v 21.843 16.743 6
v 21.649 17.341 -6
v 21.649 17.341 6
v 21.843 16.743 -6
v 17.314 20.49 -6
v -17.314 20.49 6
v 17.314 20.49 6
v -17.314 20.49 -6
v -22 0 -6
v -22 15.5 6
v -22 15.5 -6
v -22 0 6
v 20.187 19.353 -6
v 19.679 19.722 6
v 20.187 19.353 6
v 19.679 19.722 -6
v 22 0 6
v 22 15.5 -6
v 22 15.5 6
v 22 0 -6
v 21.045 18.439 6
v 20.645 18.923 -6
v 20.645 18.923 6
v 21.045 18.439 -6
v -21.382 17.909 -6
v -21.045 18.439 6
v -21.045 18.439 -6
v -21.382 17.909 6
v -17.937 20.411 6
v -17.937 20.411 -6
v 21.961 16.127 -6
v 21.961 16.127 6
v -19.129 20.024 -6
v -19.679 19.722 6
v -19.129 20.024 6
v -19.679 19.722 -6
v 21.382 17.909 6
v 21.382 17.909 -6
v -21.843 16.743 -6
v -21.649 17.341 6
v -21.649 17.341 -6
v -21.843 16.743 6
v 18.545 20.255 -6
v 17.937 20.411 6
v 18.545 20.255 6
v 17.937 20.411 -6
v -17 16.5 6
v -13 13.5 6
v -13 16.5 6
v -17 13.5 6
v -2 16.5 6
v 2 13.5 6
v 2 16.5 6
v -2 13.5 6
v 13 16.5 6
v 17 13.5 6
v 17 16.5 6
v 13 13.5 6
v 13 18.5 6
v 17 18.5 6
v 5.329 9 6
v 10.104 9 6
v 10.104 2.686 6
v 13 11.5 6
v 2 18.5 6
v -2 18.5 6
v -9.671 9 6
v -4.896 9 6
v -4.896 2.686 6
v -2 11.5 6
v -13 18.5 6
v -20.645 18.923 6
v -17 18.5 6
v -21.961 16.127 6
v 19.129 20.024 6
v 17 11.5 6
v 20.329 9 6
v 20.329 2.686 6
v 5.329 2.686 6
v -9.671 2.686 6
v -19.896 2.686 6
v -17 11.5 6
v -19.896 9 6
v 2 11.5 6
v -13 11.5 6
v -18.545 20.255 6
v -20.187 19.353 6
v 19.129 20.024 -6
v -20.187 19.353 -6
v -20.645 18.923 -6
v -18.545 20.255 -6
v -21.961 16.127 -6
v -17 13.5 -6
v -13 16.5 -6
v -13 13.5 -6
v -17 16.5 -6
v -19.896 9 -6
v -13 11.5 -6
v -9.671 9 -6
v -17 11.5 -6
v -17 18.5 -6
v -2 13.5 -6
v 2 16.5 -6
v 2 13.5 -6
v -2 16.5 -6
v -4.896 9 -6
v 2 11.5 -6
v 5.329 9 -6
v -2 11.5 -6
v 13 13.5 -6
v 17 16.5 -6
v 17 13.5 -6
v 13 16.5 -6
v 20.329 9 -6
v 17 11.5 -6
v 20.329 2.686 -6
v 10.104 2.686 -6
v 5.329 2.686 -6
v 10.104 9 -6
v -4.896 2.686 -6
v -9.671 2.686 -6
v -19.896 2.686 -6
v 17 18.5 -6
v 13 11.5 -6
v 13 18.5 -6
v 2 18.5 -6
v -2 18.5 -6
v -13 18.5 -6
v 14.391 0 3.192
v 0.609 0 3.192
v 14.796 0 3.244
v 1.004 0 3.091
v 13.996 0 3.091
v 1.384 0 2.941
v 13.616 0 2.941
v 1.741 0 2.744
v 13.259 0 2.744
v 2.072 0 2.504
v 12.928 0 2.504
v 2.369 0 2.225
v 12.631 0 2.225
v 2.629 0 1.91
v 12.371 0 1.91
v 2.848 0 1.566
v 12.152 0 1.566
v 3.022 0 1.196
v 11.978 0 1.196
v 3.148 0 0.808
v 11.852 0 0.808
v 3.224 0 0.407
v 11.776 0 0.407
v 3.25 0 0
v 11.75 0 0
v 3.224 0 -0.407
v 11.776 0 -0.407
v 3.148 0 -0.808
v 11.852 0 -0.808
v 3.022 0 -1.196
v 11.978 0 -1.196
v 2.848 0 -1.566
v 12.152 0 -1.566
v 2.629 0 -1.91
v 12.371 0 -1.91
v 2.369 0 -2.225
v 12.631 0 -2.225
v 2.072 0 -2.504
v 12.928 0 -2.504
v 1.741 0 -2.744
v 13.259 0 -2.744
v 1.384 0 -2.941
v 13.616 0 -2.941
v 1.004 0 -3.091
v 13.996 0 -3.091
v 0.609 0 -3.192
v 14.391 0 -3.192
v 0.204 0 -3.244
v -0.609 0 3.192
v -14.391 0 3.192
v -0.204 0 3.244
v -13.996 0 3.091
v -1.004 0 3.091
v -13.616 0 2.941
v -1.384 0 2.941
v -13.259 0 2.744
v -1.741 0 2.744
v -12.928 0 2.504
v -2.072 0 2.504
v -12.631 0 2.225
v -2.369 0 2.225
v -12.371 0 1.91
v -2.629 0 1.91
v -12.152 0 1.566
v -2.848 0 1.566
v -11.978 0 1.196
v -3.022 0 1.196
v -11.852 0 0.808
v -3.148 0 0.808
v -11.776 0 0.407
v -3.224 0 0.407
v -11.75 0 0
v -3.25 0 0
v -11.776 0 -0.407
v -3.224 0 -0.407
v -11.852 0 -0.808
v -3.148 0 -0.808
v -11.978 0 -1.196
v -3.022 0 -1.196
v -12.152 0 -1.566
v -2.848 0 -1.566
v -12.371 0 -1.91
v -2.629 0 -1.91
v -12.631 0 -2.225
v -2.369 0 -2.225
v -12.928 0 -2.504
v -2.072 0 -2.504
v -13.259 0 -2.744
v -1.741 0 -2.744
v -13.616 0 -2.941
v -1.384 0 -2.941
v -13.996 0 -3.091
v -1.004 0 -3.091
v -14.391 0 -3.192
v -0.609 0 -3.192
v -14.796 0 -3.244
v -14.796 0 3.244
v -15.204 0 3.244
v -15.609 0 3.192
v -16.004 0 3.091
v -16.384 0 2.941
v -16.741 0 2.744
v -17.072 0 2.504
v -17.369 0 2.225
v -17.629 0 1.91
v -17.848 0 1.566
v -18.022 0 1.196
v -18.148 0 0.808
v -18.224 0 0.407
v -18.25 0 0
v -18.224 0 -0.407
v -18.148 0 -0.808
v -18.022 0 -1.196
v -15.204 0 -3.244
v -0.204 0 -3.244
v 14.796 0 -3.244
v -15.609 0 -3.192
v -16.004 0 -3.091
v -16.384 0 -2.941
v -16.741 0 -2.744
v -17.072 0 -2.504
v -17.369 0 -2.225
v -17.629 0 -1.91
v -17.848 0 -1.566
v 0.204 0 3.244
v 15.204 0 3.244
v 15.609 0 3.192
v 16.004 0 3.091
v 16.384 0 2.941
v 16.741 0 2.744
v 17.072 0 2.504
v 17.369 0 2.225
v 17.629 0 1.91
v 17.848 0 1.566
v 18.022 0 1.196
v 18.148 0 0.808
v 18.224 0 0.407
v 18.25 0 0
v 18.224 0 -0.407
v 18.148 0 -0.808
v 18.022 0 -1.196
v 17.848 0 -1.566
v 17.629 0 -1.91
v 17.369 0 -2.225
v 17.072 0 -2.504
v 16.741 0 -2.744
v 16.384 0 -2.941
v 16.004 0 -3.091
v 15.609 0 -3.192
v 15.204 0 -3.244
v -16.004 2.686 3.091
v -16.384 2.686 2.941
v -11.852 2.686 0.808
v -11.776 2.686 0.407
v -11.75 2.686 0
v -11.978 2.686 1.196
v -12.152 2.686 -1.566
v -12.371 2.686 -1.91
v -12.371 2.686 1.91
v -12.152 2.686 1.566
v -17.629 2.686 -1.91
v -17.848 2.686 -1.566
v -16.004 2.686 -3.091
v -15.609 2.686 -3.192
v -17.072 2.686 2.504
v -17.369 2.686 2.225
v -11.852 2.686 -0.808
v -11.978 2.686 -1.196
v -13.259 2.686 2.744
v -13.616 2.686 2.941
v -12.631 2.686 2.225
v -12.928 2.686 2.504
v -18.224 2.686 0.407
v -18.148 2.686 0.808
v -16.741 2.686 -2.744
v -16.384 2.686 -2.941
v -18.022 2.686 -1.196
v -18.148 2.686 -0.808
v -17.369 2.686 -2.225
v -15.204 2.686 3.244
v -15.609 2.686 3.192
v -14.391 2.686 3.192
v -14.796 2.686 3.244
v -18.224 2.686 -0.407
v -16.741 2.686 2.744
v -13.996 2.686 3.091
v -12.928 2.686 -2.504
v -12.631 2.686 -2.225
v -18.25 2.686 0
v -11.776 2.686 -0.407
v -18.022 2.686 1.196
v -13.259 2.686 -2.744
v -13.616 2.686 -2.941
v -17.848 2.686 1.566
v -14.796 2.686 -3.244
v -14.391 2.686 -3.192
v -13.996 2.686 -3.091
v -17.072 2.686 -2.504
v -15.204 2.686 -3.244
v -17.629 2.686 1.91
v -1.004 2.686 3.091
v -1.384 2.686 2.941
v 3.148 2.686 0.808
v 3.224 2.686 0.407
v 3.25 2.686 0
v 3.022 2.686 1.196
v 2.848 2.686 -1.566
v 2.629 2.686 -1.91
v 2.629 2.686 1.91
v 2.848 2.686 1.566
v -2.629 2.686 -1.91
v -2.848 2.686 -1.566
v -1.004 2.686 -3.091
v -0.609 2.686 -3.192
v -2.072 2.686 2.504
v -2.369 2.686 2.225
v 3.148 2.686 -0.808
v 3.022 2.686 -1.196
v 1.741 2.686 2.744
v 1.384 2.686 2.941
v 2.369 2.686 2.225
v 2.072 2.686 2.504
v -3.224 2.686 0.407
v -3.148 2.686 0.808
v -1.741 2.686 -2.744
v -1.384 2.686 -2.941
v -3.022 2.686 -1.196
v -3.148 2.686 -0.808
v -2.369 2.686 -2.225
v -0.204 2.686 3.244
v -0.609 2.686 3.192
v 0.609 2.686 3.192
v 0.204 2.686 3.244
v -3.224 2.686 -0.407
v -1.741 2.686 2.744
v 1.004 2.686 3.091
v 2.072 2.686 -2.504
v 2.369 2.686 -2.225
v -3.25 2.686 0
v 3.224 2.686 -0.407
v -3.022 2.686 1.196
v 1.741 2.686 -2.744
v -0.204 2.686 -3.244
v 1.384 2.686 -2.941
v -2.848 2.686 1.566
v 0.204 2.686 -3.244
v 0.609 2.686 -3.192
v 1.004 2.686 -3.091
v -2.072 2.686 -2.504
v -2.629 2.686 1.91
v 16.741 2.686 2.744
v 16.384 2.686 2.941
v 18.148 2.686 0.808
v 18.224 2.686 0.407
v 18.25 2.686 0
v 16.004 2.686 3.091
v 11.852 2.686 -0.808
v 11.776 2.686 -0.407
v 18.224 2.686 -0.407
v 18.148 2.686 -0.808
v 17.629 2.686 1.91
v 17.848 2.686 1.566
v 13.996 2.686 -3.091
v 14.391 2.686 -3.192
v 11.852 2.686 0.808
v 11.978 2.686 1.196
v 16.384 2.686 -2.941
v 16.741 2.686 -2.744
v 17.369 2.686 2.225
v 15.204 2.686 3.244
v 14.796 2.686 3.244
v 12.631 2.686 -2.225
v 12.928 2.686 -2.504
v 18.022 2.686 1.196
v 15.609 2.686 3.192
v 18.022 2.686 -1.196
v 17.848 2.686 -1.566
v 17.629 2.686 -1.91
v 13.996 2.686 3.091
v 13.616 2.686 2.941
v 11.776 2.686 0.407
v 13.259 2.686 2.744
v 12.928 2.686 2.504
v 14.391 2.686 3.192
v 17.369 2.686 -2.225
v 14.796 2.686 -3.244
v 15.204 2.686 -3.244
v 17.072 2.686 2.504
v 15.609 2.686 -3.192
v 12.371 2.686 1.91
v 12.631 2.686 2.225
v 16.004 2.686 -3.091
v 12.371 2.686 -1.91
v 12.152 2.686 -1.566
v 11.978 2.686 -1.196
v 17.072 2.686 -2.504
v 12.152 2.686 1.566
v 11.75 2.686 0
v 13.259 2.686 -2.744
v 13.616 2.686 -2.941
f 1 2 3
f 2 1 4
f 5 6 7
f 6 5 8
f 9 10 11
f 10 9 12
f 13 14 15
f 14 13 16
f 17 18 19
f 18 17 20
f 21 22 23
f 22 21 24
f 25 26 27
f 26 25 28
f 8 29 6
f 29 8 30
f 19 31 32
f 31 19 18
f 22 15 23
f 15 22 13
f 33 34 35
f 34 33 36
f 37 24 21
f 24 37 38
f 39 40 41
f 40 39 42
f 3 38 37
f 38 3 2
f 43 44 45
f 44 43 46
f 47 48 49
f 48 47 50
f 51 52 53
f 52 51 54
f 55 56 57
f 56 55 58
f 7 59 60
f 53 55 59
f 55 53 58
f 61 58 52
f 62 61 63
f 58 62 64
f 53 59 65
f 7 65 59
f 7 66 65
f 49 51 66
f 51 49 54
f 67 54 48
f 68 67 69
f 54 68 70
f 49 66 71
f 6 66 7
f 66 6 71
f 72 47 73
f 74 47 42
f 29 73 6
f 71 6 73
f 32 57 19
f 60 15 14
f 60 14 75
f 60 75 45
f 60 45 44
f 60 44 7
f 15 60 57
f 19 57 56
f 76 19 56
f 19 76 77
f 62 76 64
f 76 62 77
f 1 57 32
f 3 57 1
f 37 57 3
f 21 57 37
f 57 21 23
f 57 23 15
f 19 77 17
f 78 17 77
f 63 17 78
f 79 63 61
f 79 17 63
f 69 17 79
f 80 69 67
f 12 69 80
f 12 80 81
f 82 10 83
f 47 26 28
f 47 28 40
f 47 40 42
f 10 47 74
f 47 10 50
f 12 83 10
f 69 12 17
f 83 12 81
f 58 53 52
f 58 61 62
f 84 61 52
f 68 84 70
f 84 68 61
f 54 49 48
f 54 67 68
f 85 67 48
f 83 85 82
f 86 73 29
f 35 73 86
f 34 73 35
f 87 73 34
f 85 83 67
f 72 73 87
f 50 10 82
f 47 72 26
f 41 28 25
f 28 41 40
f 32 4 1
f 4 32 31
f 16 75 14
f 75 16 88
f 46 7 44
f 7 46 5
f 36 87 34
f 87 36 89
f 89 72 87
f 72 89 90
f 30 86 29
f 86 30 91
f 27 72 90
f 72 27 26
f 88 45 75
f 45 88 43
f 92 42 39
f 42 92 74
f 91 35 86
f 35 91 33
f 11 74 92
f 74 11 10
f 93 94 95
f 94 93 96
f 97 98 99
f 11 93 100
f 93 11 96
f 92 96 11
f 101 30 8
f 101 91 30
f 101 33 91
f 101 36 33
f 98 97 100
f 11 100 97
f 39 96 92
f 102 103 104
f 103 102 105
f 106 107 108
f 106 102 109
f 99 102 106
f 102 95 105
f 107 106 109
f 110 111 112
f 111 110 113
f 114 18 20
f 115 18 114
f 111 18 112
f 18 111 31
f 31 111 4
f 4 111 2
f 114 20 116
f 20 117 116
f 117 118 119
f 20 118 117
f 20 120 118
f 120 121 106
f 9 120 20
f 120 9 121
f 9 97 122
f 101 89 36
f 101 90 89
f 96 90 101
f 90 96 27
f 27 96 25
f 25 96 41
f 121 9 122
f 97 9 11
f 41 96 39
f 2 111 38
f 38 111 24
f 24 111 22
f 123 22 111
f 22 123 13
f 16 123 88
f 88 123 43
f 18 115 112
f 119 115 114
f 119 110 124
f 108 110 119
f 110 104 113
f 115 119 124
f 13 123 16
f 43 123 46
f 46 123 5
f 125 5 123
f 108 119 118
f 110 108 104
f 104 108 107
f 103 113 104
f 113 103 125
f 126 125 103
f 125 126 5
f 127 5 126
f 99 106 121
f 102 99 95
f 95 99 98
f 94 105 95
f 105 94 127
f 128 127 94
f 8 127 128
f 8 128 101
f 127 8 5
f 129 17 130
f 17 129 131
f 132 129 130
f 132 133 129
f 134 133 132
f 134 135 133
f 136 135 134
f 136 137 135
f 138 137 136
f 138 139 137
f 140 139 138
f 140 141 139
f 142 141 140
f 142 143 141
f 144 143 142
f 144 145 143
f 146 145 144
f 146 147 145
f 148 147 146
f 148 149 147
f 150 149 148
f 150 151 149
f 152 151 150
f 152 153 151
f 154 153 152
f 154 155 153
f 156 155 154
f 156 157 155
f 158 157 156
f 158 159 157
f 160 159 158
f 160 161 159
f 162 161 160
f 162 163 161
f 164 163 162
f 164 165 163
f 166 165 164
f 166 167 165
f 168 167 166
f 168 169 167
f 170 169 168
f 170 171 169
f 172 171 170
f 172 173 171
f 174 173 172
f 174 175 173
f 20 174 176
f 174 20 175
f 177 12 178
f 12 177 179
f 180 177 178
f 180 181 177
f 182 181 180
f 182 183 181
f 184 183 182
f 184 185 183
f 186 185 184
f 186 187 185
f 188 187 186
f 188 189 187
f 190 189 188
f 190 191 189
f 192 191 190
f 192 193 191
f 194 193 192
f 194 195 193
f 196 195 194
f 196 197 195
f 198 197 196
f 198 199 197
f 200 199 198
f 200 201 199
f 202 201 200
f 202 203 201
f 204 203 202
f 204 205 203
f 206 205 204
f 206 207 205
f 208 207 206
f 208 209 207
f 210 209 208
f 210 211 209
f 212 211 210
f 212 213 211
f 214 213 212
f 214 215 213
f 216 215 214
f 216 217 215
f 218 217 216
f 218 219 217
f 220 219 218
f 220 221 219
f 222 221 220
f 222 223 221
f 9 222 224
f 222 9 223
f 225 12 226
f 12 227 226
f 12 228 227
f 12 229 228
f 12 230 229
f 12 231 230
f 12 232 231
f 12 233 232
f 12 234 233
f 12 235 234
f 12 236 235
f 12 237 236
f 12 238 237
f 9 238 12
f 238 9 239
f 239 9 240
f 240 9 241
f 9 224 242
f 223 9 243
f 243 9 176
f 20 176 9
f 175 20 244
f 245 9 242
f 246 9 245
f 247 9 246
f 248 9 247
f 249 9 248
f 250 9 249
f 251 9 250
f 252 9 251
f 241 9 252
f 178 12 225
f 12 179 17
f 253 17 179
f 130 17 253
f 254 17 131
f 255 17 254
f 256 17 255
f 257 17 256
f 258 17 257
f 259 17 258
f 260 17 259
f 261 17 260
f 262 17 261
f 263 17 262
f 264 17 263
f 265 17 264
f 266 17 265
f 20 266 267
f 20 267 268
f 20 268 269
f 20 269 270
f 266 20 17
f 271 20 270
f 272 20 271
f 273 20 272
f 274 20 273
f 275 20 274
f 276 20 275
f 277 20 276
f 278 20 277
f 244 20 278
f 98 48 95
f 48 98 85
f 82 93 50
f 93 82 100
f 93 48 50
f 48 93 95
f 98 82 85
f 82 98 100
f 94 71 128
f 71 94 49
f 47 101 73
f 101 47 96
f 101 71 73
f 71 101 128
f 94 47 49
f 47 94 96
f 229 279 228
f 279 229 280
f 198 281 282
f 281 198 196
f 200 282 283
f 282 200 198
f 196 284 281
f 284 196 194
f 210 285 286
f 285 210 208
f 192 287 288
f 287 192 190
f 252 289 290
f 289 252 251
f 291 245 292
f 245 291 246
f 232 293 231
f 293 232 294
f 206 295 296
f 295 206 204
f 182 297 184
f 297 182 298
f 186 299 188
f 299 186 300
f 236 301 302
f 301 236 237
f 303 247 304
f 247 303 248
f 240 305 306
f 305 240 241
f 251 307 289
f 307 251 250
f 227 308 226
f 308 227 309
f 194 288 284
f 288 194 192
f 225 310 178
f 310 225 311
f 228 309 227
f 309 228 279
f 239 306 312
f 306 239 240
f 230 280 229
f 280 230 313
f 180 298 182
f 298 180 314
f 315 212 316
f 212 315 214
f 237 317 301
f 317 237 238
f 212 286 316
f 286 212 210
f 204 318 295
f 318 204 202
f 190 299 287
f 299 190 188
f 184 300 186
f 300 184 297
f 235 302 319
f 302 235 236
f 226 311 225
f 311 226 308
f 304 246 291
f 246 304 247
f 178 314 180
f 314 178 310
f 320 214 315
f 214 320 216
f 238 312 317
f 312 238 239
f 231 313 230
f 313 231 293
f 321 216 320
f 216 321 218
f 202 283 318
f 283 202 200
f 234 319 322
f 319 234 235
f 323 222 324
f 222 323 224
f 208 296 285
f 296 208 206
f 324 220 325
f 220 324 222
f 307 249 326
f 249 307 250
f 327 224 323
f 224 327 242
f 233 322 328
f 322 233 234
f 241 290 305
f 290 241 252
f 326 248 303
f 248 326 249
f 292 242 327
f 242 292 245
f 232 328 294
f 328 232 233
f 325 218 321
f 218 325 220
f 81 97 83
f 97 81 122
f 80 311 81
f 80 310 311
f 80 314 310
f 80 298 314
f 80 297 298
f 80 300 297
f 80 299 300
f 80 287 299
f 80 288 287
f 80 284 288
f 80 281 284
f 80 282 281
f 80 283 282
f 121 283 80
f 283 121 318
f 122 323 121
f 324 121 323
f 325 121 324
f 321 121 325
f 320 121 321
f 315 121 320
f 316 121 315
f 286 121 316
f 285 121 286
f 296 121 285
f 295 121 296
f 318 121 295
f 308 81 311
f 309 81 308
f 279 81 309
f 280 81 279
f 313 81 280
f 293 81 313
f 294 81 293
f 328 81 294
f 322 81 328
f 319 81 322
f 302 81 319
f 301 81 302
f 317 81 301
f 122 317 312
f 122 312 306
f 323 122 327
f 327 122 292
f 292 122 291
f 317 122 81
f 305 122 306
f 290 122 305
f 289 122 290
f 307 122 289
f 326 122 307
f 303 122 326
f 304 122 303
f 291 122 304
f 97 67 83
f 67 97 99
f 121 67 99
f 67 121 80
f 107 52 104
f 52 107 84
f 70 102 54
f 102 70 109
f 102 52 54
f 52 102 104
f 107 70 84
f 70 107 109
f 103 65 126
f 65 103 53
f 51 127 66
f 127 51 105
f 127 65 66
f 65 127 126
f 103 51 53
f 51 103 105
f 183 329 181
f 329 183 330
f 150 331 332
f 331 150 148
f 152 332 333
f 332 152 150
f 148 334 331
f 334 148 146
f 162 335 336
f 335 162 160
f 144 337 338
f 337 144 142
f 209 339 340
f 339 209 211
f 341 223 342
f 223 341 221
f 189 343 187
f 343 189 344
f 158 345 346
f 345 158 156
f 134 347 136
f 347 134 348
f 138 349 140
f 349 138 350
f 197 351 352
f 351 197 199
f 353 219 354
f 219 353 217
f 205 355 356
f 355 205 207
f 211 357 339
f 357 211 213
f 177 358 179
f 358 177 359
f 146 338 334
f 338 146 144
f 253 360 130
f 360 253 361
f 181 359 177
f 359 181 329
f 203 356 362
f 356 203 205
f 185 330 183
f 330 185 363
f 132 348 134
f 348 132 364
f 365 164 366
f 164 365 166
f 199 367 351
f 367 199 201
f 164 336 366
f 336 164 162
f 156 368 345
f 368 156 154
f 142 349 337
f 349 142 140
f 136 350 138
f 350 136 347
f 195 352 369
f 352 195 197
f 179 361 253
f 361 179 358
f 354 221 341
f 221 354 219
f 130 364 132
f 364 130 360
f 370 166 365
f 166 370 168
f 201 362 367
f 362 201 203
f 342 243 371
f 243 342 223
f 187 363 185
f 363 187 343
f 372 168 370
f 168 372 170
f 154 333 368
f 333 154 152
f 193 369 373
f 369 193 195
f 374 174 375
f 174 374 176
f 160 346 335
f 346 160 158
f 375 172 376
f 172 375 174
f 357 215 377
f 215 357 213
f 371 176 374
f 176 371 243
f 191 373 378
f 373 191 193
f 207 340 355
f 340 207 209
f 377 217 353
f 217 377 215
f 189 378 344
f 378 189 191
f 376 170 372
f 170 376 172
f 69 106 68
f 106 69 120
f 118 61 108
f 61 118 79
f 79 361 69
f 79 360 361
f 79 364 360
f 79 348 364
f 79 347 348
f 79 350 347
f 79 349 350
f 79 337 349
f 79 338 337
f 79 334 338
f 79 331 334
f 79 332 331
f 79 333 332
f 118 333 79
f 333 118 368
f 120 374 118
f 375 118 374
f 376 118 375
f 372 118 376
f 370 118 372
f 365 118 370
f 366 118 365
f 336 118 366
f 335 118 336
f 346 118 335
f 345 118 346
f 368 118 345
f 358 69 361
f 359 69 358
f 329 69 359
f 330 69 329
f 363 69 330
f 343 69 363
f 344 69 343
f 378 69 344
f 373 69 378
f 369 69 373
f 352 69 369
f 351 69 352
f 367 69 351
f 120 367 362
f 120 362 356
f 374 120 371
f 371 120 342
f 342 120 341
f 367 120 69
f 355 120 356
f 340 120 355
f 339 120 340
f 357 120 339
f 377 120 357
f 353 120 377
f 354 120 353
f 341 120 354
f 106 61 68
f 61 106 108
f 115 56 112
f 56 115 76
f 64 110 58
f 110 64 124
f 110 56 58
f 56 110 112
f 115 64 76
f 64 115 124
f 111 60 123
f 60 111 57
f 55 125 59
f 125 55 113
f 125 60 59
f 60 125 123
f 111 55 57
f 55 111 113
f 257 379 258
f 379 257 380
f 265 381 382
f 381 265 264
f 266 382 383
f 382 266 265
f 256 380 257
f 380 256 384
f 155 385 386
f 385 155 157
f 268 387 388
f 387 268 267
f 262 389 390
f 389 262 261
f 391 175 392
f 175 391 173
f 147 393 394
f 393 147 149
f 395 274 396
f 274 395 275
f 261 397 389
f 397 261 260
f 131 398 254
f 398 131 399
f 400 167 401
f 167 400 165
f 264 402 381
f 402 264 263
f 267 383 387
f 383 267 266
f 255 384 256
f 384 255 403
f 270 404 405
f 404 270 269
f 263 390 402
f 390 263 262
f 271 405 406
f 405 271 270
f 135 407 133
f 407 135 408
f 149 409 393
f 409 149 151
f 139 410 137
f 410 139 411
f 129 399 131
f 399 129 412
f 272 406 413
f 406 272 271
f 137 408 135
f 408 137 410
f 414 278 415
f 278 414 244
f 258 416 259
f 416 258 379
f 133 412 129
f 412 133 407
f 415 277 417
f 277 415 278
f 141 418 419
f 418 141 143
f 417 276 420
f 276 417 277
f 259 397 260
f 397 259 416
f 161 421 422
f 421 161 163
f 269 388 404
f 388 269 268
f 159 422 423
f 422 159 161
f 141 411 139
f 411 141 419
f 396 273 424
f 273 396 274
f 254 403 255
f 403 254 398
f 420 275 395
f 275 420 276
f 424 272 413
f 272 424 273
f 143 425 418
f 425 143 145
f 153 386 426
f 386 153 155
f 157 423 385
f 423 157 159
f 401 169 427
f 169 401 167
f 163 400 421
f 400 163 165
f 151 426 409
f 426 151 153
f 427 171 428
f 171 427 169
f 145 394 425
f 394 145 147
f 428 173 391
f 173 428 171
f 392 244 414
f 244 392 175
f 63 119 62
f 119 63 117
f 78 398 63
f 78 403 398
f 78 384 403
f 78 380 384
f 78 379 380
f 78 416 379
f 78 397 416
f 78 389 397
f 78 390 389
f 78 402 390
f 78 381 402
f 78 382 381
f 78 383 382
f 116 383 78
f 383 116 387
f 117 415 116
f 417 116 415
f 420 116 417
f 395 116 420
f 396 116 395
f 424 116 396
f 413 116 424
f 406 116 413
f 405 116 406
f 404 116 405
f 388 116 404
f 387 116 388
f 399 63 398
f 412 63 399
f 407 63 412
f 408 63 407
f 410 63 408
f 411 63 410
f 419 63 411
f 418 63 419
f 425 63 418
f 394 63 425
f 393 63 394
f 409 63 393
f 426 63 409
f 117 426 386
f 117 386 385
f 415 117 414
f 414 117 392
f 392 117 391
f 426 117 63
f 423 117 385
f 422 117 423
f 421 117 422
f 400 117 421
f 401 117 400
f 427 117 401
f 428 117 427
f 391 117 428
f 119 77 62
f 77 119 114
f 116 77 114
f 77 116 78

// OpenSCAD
$fn = 50;


difference() {
	union() {
		translate(v = [0, 13.5000000000, -6.0000000000]) {
			rotate(a = [0, 0, 0]) {
				hull() {
					translate(v = [-17.0000000000, 2.0000000000, 0]) {
						rotate(a = [0, 0, 0]) {
							translate(v = [0, 0, 0]) {
								rotate(a = [0, 0, 0]) {
									cylinder(h = 12, r = 5);
								}
							}
						}
					}
					translate(v = [17.0000000000, 2.0000000000, 0]) {
						rotate(a = [0, 0, 0]) {
							translate(v = [0, 0, 0]) {
								rotate(a = [0, 0, 0]) {
									cylinder(h = 12, r = 5);
								}
							}
						}
					}
					translate(v = [-17.0000000000, -2.0000000000, 0]) {
						rotate(a = [0, 0, 0]) {
							translate(v = [0, 0, 0]) {
								rotate(a = [0, 0, 0]) {
									cylinder(h = 12, r = 5);
								}
							}
						}
					}
					translate(v = [17.0000000000, -2.0000000000, 0]) {
						rotate(a = [0, 0, 0]) {
							translate(v = [0, 0, 0]) {
								rotate(a = [0, 0, 0]) {
									cylinder(h = 12, r = 5);
								}
							}
						}
					}
				}
			}
		}
		translate(v = [-22.0000000000, 0, -6.0000000000]) {
			rotate(a = [0, 0, 0]) {
				cube(size = [44, 13.5000000000, 12]);
			}
		}
	}
	union() {
		translate(v = [-17.0000000000, 11.5000000000, -50]) {
			rotate(a = [0, 0, 0]) {
				cube(size = [4, 2, 100]);
			}
		}
		translate(v = [-17.0000000000, 16.5000000000, -50]) {
			rotate(a = [0, 0, 0]) {
				cube(size = [4, 2, 100]);
			}
		}
		translate(v = [-15.0000000000, 8, 0]) {
			rotate(a = [90, 0, 0]) {
				cylinder(h = 8, r = 3.2500000000);
			}
		}
		translate(v = [-19.8960138648, 9, -50]) {
			rotate(a = [90, 0, 0]) {
				cube(size = [10.2253032929, 100, 6.3142500000]);
			}
		}
		translate(v = [-2.0000000000, 11.5000000000, -50]) {
			rotate(a = [0, 0, 0]) {
				cube(size = [4, 2, 100]);
			}
		}
		translate(v = [-2.0000000000, 16.5000000000, -50]) {
			rotate(a = [0, 0, 0]) {
				cube(size = [4, 2, 100]);
			}
		}
		translate(v = [0.0000000000, 8, 0]) {
			rotate(a = [90, 0, 0]) {
				cylinder(h = 8, r = 3.2500000000);
			}
		}
		translate(v = [-4.8960138648, 9, -50]) {
			rotate(a = [90, 0, 0]) {
				cube(size = [10.2253032929, 100, 6.3142500000]);
			}
		}
		translate(v = [13.0000000000, 11.5000000000, -50]) {
			rotate(a = [0, 0, 0]) {
				cube(size = [4, 2, 100]);
			}
		}
		translate(v = [13.0000000000, 16.5000000000, -50]) {
			rotate(a = [0, 0, 0]) {
				cube(size = [4, 2, 100]);
			}
		}
		translate(v = [15.0000000000, 8, 0]) {
			rotate(a = [90, 0, 0]) {
				cylinder(h = 8, r = 3.2500000000);
			}
		}
		translate(v = [10.1039861352, 9, -50]) {
			rotate(a = [90, 0, 0]) {
				cube(size = [10.2253032929, 100, 6.3142500000]);
			}
		}
	}
}
